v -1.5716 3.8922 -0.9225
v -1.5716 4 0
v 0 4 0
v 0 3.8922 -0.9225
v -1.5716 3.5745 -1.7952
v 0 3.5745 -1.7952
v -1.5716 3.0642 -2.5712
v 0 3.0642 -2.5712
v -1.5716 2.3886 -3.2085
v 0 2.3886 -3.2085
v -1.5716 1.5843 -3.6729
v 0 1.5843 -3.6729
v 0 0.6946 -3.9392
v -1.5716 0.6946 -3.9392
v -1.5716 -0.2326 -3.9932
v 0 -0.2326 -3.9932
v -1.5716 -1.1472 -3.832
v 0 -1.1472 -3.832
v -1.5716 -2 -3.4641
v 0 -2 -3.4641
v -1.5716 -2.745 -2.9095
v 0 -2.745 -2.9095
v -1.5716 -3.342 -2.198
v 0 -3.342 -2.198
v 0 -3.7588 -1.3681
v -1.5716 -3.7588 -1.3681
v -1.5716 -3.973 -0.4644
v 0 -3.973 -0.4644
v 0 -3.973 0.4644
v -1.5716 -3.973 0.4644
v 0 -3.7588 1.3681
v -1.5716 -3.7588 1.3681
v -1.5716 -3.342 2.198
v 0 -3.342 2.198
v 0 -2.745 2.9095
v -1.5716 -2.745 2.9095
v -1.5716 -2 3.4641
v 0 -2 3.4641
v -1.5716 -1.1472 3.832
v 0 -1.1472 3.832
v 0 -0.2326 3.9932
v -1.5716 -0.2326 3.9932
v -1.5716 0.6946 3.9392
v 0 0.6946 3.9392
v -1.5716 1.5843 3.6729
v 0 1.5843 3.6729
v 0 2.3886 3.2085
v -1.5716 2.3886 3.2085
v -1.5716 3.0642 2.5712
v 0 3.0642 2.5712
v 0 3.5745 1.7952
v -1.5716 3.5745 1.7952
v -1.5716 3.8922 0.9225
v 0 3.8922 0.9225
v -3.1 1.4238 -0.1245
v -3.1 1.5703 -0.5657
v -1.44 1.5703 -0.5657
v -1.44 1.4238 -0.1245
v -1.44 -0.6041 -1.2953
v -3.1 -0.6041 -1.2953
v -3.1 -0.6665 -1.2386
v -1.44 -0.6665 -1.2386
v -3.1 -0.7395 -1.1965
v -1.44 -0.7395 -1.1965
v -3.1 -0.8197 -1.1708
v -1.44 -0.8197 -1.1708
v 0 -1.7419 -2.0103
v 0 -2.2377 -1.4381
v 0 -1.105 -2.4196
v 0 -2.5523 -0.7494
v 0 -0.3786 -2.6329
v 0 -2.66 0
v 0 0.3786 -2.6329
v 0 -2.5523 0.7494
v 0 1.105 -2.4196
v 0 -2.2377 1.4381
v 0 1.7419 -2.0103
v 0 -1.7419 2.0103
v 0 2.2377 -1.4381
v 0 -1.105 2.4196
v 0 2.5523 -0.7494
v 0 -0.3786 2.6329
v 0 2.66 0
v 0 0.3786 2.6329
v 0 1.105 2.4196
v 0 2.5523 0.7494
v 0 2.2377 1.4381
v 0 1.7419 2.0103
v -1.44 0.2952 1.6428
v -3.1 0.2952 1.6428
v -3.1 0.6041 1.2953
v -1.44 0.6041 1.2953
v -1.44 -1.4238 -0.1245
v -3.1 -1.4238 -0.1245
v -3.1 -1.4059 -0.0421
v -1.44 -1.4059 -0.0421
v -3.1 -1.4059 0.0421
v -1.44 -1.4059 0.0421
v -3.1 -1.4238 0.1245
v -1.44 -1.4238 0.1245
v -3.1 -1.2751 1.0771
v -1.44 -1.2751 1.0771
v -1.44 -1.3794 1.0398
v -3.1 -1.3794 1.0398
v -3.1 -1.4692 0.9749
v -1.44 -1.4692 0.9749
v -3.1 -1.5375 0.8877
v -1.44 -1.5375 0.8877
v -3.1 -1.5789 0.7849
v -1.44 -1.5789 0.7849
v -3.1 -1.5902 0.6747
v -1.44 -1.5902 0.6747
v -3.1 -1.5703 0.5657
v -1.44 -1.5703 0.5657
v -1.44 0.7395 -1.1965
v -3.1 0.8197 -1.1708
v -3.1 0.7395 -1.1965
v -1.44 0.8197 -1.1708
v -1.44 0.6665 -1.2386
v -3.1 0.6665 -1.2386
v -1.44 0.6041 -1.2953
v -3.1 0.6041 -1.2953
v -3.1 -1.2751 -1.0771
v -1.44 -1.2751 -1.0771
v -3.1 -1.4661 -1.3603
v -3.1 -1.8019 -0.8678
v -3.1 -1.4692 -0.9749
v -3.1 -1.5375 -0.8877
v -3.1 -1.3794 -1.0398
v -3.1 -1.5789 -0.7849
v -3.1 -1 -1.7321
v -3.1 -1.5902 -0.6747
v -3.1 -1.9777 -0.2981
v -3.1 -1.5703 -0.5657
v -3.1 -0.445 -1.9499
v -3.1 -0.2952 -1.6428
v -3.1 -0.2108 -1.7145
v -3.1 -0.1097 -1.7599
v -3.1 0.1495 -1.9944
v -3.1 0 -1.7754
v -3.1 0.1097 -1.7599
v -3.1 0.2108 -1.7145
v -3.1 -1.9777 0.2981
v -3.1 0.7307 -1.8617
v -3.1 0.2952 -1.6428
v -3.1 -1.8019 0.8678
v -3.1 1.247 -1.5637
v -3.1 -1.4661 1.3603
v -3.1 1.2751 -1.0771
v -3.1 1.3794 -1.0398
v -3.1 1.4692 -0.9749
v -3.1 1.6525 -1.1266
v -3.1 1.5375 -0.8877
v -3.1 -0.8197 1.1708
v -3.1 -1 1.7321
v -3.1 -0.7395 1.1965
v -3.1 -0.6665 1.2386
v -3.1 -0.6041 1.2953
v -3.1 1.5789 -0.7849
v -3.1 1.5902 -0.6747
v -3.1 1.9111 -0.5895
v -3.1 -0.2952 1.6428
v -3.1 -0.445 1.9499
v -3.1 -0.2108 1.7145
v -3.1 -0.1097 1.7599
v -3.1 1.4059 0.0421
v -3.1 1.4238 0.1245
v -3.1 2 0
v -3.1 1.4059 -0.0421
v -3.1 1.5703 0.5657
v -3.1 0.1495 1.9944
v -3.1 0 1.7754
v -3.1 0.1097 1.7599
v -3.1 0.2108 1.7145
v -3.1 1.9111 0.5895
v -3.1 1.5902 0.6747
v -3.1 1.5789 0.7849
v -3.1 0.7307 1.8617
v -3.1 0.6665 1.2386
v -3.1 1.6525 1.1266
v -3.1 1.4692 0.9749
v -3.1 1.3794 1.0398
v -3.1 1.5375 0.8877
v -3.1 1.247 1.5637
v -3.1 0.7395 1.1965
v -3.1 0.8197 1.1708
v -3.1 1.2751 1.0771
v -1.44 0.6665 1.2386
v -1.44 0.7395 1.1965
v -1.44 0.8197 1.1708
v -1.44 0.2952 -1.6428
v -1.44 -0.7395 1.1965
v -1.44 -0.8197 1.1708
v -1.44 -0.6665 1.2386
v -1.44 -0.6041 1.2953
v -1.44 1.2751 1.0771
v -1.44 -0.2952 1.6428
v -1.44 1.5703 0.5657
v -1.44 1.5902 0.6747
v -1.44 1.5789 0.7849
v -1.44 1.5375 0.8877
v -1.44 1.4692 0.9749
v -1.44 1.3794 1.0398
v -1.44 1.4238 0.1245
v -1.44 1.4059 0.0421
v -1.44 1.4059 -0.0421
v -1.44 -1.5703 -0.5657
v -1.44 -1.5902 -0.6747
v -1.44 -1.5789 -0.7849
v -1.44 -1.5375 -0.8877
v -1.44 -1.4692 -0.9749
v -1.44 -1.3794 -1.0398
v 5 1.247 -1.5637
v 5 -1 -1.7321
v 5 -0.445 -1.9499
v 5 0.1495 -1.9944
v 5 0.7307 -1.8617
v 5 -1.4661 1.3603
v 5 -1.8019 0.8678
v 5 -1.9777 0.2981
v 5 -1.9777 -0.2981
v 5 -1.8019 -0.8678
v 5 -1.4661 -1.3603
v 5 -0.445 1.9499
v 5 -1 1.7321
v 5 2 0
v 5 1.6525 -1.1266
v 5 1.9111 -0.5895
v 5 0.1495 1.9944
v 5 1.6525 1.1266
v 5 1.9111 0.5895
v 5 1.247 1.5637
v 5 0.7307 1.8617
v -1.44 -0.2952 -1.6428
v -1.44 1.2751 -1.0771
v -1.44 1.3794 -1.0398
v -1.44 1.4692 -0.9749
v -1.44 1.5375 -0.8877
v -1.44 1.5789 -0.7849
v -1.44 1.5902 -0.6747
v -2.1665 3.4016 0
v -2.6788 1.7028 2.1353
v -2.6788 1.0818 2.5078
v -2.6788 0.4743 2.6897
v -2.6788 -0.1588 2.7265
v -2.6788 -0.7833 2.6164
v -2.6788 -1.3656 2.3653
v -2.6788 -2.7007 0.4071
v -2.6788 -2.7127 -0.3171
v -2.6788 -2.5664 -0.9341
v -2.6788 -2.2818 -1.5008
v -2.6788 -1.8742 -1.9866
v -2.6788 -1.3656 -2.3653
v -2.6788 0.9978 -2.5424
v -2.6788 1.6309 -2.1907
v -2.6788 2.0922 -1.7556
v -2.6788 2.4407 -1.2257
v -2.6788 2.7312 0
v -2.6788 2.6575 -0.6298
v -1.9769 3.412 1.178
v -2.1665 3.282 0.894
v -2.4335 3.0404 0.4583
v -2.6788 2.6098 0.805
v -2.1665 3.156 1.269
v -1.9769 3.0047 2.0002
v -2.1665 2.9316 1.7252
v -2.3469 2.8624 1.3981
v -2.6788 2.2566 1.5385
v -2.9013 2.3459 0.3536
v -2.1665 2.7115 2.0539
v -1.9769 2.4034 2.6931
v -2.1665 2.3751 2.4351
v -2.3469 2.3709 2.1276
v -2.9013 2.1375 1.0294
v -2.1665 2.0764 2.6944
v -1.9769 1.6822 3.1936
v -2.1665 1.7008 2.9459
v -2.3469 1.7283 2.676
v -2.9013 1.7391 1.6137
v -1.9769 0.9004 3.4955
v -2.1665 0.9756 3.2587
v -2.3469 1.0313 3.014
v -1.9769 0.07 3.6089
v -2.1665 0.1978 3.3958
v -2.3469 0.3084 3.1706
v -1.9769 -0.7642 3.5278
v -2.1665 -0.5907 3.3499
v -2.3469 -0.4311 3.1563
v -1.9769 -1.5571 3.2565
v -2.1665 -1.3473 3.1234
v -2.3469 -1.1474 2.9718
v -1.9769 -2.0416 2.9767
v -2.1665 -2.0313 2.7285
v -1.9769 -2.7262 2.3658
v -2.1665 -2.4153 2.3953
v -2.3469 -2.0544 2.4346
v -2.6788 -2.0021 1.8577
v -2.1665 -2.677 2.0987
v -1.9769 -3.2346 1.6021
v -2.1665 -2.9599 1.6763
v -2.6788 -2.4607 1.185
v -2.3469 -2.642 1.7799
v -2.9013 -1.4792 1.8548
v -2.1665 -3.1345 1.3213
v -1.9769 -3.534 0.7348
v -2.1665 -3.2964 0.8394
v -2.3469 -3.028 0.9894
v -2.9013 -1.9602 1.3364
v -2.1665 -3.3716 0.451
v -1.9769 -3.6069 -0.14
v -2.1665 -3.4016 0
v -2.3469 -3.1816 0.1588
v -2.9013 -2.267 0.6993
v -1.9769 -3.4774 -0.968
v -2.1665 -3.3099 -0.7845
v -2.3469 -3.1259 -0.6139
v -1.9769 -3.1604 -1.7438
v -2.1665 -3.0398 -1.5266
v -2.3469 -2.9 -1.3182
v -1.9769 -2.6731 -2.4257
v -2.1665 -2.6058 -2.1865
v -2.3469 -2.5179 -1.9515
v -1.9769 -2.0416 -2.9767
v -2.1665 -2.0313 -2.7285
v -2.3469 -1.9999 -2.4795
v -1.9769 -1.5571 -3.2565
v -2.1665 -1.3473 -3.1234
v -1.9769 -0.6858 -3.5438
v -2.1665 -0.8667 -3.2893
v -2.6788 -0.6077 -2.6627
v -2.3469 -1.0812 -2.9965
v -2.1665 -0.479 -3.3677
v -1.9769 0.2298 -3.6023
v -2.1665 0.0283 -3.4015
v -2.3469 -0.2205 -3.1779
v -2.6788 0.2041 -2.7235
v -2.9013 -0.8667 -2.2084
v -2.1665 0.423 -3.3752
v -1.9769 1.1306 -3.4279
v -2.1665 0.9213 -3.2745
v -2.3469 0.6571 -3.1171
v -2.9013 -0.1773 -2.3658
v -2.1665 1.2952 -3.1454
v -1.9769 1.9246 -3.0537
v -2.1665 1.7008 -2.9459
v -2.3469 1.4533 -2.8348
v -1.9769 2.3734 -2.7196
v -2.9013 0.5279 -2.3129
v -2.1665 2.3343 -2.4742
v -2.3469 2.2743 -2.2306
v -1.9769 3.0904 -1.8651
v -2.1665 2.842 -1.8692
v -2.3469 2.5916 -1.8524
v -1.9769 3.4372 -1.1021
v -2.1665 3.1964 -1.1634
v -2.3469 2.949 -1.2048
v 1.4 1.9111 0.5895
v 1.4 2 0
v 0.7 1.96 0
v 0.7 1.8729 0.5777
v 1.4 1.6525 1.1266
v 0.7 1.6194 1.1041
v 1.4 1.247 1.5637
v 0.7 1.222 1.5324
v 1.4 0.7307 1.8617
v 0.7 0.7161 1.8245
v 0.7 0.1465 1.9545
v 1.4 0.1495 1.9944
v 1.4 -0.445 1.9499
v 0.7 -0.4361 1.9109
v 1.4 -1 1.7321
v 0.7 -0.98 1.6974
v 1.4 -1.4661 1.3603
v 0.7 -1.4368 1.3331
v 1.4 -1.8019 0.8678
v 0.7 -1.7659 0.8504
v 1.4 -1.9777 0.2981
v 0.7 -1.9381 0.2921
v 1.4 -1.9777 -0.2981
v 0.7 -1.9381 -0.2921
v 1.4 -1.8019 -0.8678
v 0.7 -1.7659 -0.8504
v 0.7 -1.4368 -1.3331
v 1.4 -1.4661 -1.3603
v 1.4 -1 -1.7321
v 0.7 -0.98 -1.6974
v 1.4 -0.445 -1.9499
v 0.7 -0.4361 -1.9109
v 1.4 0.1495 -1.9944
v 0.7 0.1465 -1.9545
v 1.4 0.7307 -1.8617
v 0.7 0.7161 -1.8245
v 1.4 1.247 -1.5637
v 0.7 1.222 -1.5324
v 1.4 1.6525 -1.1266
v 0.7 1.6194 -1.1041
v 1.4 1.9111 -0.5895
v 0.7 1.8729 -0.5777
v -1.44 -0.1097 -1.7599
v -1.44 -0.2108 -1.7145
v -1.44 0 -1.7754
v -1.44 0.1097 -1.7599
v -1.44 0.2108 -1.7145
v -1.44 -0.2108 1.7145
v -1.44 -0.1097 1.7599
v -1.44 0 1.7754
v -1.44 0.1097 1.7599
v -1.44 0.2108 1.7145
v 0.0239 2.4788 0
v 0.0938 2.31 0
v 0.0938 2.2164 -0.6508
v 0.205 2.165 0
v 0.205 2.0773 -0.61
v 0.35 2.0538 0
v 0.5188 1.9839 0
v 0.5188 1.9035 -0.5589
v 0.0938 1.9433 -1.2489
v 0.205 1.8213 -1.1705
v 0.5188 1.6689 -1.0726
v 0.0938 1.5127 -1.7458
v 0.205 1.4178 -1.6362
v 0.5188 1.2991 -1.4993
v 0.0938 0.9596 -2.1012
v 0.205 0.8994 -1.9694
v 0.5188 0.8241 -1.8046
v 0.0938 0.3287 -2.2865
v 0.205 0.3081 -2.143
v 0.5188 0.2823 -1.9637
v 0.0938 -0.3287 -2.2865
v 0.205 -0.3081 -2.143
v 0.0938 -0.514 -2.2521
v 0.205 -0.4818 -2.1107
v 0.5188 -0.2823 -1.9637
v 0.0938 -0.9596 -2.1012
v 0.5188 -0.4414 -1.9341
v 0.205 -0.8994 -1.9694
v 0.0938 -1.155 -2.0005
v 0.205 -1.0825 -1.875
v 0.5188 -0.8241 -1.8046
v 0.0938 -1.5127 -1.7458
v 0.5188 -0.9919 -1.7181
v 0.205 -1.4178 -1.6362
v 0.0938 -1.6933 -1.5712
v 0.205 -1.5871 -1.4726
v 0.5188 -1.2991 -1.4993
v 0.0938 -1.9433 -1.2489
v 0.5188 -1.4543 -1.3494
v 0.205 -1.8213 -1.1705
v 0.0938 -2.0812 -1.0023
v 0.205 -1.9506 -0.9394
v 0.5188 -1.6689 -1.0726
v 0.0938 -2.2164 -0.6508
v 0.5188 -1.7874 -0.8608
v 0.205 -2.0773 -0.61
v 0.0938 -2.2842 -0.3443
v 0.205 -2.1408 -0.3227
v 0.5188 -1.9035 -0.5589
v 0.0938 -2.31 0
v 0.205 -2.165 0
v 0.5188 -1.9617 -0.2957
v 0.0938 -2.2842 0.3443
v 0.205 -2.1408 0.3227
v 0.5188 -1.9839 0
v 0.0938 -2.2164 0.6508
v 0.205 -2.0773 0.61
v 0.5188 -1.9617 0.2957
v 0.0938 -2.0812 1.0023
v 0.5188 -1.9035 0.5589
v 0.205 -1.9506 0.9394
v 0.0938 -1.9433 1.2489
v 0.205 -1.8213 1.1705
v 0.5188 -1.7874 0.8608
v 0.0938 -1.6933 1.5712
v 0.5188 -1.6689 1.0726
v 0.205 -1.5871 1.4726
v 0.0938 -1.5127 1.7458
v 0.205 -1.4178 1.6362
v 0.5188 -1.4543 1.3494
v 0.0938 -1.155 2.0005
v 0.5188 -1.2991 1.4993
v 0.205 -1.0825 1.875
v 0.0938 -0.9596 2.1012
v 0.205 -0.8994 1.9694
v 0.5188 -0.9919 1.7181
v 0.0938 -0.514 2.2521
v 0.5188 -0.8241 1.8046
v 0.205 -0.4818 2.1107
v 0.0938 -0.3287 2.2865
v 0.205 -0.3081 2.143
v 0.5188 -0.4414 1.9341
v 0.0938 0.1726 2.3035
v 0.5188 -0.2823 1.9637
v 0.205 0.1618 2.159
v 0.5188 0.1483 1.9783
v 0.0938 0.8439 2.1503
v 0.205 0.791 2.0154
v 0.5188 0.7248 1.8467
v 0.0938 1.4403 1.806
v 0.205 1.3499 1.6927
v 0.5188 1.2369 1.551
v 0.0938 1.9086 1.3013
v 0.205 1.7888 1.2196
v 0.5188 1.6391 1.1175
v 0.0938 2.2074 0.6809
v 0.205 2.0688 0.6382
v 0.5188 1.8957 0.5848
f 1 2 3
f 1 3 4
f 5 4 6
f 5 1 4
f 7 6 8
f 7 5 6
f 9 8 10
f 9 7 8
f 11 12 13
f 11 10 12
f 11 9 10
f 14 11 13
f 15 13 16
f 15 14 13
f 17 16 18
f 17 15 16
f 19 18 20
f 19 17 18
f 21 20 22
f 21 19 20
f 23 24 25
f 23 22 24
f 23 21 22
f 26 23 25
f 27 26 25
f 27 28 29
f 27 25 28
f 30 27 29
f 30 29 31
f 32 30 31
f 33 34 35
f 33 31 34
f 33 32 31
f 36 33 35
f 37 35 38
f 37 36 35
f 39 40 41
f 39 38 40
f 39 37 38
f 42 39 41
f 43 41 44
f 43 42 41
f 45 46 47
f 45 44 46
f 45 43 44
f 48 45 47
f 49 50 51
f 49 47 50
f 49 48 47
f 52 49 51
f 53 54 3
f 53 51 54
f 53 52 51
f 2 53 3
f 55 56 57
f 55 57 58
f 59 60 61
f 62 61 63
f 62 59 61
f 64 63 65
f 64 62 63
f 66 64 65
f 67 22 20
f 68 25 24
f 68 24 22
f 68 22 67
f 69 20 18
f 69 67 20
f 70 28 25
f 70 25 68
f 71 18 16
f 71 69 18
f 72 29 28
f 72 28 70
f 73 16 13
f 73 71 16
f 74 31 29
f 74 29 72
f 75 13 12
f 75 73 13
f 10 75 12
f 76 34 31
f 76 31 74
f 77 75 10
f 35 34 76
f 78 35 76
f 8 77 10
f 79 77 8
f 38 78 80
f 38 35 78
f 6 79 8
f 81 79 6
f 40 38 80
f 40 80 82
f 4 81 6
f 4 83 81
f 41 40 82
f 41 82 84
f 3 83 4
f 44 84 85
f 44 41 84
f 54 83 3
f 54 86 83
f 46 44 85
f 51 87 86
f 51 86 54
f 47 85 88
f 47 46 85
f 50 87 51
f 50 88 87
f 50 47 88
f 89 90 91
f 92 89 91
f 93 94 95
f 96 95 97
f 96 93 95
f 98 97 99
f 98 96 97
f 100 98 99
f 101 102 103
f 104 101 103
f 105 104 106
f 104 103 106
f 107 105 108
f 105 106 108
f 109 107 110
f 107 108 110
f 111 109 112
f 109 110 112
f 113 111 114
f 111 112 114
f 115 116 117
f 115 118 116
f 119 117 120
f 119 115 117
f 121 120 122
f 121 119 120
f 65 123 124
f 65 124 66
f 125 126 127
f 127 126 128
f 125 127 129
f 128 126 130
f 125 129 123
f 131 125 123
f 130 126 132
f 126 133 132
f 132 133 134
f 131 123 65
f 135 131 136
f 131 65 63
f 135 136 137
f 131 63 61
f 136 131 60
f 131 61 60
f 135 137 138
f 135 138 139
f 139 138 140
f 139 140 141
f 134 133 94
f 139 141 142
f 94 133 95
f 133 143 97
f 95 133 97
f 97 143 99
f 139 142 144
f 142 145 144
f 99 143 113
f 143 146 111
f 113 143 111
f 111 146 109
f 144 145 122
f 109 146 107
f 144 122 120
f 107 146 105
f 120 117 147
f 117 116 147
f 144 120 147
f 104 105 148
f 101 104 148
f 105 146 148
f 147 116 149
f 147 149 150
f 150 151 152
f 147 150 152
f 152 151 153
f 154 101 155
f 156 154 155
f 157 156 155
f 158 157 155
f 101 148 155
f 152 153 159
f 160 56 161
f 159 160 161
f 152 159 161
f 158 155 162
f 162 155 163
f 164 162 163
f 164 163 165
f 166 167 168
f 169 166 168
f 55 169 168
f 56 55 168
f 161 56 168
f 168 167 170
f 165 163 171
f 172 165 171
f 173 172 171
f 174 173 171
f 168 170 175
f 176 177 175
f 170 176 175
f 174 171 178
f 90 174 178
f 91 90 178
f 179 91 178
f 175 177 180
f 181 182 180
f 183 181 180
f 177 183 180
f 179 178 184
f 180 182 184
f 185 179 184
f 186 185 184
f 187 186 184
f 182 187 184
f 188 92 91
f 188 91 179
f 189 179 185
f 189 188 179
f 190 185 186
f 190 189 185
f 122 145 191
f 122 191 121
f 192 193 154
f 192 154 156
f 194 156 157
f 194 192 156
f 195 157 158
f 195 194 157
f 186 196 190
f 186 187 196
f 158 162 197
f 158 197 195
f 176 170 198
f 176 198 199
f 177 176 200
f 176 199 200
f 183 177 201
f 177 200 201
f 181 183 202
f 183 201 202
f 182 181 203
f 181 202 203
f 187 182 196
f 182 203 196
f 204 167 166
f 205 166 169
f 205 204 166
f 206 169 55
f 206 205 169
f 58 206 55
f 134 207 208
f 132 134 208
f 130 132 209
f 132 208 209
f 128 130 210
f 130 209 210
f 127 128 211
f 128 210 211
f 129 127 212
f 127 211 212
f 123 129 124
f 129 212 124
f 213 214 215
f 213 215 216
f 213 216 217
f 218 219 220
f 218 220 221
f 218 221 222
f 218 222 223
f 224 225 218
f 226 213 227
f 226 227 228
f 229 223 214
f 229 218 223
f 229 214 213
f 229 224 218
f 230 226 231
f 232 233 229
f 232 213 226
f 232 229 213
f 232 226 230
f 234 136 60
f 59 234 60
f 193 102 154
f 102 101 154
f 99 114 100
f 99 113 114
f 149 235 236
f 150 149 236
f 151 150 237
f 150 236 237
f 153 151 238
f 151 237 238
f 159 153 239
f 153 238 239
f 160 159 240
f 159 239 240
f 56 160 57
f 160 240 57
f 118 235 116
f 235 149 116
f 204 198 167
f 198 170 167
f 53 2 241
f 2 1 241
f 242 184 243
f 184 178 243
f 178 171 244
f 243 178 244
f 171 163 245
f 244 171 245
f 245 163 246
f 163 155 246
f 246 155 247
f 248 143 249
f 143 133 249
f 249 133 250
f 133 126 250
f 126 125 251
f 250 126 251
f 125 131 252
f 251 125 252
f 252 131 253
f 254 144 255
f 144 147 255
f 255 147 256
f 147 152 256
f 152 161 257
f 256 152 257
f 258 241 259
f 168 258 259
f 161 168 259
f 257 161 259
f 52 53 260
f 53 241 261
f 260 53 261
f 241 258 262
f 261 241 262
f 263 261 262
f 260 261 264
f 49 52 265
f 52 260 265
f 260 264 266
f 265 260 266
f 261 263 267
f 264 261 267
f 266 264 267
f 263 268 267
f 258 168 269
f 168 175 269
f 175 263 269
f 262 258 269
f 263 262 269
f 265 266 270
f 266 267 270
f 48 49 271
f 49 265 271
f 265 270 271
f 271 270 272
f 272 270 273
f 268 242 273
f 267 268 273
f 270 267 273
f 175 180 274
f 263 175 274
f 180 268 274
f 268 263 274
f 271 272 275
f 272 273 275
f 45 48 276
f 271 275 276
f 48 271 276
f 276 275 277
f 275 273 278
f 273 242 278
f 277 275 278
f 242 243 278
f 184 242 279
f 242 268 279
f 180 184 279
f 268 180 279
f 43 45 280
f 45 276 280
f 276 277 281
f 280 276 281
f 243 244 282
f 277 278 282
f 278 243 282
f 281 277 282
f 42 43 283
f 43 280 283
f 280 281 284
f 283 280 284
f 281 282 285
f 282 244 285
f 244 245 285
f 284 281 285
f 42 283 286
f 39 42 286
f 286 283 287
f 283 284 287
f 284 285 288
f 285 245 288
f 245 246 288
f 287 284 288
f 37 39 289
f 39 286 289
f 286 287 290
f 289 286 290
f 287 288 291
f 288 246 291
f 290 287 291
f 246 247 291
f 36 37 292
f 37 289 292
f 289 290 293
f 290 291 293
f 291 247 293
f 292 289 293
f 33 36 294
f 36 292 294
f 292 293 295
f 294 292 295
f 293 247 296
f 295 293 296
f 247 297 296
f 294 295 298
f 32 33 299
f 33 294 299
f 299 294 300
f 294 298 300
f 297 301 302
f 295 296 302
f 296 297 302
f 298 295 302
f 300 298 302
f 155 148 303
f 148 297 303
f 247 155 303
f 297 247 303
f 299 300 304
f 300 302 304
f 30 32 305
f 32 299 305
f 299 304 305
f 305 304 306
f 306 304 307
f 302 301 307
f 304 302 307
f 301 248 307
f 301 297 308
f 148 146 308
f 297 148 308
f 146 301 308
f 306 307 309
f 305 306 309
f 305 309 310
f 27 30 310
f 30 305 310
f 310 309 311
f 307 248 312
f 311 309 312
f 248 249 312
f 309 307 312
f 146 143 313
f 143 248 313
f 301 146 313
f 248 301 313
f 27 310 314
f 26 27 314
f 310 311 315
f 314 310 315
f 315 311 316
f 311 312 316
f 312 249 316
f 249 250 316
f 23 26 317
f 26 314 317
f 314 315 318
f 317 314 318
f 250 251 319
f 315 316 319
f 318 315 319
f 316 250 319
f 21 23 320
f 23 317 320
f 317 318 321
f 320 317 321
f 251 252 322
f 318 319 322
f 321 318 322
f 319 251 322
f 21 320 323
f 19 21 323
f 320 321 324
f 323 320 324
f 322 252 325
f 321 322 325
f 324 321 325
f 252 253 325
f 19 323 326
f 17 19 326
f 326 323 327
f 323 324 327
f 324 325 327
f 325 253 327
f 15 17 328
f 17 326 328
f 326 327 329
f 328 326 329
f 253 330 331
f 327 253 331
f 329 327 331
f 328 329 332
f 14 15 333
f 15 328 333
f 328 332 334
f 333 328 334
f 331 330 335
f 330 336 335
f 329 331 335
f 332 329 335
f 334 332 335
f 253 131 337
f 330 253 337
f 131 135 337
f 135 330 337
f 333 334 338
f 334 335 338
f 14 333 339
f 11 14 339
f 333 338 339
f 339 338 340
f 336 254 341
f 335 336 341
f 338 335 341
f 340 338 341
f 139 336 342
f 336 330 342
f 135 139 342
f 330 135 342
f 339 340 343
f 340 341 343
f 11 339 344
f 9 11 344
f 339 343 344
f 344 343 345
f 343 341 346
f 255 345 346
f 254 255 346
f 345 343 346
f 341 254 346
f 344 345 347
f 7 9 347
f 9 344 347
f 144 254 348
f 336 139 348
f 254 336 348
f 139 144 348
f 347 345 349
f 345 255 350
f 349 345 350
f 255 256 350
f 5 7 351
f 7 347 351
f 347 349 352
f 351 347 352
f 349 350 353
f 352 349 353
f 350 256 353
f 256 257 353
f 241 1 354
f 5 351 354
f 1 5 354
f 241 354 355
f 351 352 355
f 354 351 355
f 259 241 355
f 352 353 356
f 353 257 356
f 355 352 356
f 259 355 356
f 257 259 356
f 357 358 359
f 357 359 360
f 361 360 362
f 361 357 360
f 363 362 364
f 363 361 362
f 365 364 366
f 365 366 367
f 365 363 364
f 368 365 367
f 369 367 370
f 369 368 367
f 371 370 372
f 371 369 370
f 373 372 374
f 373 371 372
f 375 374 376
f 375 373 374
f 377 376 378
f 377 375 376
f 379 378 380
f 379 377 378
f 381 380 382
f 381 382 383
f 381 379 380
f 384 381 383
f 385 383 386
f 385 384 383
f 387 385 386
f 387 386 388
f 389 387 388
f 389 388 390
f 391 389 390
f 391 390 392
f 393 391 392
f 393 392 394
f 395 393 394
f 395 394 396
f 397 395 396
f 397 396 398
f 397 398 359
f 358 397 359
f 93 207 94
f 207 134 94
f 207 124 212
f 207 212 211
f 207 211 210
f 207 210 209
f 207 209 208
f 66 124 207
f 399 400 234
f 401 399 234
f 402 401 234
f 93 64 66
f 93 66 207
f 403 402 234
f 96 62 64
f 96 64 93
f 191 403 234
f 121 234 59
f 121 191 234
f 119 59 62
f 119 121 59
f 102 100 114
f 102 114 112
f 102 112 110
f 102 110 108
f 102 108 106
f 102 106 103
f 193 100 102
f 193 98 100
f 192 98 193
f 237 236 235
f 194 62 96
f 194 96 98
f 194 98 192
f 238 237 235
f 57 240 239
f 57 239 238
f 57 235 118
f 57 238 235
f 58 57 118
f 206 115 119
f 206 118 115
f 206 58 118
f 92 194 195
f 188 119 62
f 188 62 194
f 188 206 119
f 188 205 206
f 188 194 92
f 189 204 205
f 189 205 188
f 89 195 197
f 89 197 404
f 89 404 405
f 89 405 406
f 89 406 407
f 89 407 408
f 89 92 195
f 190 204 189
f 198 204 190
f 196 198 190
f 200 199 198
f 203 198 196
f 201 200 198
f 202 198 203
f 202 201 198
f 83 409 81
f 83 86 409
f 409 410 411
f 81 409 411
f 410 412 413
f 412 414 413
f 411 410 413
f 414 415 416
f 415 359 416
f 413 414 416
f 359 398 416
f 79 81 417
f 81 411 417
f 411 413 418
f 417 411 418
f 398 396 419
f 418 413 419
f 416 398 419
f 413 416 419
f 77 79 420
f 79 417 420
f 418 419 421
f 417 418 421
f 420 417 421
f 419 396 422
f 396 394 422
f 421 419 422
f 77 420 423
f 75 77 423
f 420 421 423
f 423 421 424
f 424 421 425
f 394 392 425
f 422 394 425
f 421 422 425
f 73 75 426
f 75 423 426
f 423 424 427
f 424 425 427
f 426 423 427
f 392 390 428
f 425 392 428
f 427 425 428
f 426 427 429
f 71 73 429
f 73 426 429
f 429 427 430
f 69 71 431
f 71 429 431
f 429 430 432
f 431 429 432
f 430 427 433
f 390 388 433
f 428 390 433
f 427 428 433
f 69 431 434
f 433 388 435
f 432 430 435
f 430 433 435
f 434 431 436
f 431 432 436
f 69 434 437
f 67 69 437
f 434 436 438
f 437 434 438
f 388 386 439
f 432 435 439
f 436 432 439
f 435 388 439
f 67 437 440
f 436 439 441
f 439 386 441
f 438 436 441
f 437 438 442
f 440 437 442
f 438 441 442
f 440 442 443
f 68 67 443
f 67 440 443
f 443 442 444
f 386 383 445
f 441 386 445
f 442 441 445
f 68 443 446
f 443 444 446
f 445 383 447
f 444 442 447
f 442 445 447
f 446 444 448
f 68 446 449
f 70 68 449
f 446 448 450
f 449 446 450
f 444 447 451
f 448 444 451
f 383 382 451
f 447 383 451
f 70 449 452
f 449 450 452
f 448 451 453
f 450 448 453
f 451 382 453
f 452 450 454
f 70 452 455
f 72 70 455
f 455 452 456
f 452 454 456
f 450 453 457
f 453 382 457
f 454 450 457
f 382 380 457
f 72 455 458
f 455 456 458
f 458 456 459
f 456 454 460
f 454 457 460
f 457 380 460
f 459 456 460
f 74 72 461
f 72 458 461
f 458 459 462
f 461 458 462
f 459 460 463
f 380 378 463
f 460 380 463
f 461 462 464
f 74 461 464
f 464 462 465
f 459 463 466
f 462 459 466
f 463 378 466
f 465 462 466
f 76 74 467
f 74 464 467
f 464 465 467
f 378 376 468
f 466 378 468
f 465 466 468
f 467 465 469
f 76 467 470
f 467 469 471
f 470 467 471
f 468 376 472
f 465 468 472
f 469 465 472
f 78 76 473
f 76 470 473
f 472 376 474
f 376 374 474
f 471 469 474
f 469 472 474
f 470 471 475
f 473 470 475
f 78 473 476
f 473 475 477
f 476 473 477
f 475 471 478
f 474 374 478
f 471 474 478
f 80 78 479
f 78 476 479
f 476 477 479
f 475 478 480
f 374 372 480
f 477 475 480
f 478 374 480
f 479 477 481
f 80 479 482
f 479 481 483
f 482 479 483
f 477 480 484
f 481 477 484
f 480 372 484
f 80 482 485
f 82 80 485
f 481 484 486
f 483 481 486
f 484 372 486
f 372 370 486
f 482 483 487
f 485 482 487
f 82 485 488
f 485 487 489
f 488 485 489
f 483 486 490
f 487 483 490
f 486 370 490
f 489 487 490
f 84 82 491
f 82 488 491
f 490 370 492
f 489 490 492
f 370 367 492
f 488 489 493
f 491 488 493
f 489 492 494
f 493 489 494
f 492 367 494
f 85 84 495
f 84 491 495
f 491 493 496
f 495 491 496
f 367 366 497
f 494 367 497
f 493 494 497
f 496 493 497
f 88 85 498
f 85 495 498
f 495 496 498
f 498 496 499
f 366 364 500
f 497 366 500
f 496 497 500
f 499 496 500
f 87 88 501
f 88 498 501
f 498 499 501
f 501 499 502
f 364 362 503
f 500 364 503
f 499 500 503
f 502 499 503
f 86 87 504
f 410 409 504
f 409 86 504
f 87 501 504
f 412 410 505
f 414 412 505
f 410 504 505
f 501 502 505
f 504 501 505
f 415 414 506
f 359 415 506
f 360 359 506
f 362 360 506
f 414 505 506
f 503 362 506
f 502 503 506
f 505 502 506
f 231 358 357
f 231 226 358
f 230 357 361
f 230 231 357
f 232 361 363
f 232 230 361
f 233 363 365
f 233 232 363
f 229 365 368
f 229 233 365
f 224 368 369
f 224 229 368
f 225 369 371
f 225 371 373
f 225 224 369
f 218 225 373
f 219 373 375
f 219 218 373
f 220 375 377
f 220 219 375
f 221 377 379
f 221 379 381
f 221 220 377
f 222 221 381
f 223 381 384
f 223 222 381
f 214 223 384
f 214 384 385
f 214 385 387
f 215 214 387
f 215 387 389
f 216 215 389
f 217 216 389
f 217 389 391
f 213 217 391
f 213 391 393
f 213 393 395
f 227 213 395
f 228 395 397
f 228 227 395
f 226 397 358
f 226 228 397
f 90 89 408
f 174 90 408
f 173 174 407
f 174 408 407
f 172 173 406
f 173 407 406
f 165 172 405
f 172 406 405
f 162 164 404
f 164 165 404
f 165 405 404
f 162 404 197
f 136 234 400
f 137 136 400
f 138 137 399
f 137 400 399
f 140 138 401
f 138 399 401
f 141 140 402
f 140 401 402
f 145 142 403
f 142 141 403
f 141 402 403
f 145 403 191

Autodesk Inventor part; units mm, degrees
ref_plane "YZ Plane" through (0, 0, 0) normal (1, 0, 0) x (0, 1, 0)
ref_plane "XZ Plane" through (0, 0, 0) normal (0, 1, 0) x (-1, 0, 0)
ref_plane "XY Plane" through (0, 0, 0) normal (0, 0, 1) x (1, 0, 0)
sketch "Sketch4" plane through (0, 0, 0) normal (0, 0, 1) x (1, 0, 0)
  line L0 (-3.1, 0) -> (5, 0)
  line L1 (0, 0) -> (-3.1, 0)
  line L2 (0, 4) -> (0, 2.66)
  line L3 (0.7, 1.96) -> (0.7, 1.96)
  line L4 (0.7, 1.96) -> (1.4, 2)
  arc A0 (0, 2.66) -> (0.7, 1.96) centre (0.7, 2.66) ccw
  line L5 (-3.1, 0) -> (-3.1, 2)
  line L6 (0, 4) -> (-1.5716, 4)
  arc A1 (-1.5716, 4) -> (-3.1, 2) centre (2.731, -0.8721) ccw
  line L7 (1.4, 2) -> (5, 2)
  line L8 (5, 2) -> (5, 0)
  point P0 (0, 1.96)
  dimension "d71" = 0.7
  dimension "d72" = 5
  dimension "d74" = 0.7
  dimension "d75" = 3.92
  dimension "d78" = 4
  dimension "d82" = 6.5
  dimension "d83" = 3.1
  dimension "d84" = 8
  dimension "d104" = 3.6
  dimension "d105" = 4
revolve "Revolution7" add sketch "Sketch4" angle 360 about axis through (-3.1, 0, 0) along (1, 0, 0)
sketch "Sketch5" plane through (-3.1, 0, 0) normal (-1, 0, 0) x (0, 0, 1)
  circle A0 centre (0, 0) radius 1.975 construction
  circle A1 centre (0, 0) radius 1.3825 construction
  line L0 (0, 0) -> (-1.1973, 0.6912)
  line L1 (0, 0) -> (-1.1973, -0.6912)
  line L2 (-1.8008, 0) -> (1.7887, 0)
  line L3 (-1.975, 0) -> (-1.1973, -0.6912)
  line L4 (-1.975, 0) -> (-1.1973, 0.6912)
  point P0 (0, 0)
  dimension "d88" = 3.95
  dimension "d89" = 2.765
  dimension "d90" = 30
  dimension "d91" = 30
extrude "Extrusion1" cut sketch "Sketch5" against normal blind 1.66
pattern_circular "Circular Pattern1" count 6 over 360 about axis through (-10, 0, 0) along (1, 0, 0) of "Extrusion1"
fillet "Fillet1" radius 0.395 12 edges at (-2.27, -1.7104, -0.9875) (-2.27, -0.6912, -1.1973) (-2.27, -1.3825, 0) (-2.27, -1.7104, 0.9875) (-2.27, -0.6912, 1.1973) (-2.27, 0, 1.975) (-2.27, 1.3825, 0) (-2.27, 1.7104, 0.9875) (-2.27, 0.6913, 1.1973) (-2.27, 0.6912, -1.1973) (-2.27, 0, -1.975) (-2.27, 1.7104, -0.9875)
thread "Thread7" size "M4x0.7" class "6g" standard "ISO Metric profile" length 3.6
equation "\"a\" = 1.4"
equation "\"b\" = 3.6"
equation "\"dk\" = 8"
equation "\"k\" = 3.1"
equation "\"r\" = 0.7"
equation "\"rf\" = 6.5"
equation "\"x\" = 0.7"
equation "\"A_\" = 3.95"
equation "\"t\" = 1.66"
equation "\"p\" = 0.7"
equation "\"l_\" = 5"
equation "\"d\" = 4"
equation "\"ds_\" = 3.92"
equation "\"lg\" = 0"
properties part number "Flachkopfschraube mit Innenrund ISO 14583 - M4 x 5 - A2-70" material "Edelstahl"
